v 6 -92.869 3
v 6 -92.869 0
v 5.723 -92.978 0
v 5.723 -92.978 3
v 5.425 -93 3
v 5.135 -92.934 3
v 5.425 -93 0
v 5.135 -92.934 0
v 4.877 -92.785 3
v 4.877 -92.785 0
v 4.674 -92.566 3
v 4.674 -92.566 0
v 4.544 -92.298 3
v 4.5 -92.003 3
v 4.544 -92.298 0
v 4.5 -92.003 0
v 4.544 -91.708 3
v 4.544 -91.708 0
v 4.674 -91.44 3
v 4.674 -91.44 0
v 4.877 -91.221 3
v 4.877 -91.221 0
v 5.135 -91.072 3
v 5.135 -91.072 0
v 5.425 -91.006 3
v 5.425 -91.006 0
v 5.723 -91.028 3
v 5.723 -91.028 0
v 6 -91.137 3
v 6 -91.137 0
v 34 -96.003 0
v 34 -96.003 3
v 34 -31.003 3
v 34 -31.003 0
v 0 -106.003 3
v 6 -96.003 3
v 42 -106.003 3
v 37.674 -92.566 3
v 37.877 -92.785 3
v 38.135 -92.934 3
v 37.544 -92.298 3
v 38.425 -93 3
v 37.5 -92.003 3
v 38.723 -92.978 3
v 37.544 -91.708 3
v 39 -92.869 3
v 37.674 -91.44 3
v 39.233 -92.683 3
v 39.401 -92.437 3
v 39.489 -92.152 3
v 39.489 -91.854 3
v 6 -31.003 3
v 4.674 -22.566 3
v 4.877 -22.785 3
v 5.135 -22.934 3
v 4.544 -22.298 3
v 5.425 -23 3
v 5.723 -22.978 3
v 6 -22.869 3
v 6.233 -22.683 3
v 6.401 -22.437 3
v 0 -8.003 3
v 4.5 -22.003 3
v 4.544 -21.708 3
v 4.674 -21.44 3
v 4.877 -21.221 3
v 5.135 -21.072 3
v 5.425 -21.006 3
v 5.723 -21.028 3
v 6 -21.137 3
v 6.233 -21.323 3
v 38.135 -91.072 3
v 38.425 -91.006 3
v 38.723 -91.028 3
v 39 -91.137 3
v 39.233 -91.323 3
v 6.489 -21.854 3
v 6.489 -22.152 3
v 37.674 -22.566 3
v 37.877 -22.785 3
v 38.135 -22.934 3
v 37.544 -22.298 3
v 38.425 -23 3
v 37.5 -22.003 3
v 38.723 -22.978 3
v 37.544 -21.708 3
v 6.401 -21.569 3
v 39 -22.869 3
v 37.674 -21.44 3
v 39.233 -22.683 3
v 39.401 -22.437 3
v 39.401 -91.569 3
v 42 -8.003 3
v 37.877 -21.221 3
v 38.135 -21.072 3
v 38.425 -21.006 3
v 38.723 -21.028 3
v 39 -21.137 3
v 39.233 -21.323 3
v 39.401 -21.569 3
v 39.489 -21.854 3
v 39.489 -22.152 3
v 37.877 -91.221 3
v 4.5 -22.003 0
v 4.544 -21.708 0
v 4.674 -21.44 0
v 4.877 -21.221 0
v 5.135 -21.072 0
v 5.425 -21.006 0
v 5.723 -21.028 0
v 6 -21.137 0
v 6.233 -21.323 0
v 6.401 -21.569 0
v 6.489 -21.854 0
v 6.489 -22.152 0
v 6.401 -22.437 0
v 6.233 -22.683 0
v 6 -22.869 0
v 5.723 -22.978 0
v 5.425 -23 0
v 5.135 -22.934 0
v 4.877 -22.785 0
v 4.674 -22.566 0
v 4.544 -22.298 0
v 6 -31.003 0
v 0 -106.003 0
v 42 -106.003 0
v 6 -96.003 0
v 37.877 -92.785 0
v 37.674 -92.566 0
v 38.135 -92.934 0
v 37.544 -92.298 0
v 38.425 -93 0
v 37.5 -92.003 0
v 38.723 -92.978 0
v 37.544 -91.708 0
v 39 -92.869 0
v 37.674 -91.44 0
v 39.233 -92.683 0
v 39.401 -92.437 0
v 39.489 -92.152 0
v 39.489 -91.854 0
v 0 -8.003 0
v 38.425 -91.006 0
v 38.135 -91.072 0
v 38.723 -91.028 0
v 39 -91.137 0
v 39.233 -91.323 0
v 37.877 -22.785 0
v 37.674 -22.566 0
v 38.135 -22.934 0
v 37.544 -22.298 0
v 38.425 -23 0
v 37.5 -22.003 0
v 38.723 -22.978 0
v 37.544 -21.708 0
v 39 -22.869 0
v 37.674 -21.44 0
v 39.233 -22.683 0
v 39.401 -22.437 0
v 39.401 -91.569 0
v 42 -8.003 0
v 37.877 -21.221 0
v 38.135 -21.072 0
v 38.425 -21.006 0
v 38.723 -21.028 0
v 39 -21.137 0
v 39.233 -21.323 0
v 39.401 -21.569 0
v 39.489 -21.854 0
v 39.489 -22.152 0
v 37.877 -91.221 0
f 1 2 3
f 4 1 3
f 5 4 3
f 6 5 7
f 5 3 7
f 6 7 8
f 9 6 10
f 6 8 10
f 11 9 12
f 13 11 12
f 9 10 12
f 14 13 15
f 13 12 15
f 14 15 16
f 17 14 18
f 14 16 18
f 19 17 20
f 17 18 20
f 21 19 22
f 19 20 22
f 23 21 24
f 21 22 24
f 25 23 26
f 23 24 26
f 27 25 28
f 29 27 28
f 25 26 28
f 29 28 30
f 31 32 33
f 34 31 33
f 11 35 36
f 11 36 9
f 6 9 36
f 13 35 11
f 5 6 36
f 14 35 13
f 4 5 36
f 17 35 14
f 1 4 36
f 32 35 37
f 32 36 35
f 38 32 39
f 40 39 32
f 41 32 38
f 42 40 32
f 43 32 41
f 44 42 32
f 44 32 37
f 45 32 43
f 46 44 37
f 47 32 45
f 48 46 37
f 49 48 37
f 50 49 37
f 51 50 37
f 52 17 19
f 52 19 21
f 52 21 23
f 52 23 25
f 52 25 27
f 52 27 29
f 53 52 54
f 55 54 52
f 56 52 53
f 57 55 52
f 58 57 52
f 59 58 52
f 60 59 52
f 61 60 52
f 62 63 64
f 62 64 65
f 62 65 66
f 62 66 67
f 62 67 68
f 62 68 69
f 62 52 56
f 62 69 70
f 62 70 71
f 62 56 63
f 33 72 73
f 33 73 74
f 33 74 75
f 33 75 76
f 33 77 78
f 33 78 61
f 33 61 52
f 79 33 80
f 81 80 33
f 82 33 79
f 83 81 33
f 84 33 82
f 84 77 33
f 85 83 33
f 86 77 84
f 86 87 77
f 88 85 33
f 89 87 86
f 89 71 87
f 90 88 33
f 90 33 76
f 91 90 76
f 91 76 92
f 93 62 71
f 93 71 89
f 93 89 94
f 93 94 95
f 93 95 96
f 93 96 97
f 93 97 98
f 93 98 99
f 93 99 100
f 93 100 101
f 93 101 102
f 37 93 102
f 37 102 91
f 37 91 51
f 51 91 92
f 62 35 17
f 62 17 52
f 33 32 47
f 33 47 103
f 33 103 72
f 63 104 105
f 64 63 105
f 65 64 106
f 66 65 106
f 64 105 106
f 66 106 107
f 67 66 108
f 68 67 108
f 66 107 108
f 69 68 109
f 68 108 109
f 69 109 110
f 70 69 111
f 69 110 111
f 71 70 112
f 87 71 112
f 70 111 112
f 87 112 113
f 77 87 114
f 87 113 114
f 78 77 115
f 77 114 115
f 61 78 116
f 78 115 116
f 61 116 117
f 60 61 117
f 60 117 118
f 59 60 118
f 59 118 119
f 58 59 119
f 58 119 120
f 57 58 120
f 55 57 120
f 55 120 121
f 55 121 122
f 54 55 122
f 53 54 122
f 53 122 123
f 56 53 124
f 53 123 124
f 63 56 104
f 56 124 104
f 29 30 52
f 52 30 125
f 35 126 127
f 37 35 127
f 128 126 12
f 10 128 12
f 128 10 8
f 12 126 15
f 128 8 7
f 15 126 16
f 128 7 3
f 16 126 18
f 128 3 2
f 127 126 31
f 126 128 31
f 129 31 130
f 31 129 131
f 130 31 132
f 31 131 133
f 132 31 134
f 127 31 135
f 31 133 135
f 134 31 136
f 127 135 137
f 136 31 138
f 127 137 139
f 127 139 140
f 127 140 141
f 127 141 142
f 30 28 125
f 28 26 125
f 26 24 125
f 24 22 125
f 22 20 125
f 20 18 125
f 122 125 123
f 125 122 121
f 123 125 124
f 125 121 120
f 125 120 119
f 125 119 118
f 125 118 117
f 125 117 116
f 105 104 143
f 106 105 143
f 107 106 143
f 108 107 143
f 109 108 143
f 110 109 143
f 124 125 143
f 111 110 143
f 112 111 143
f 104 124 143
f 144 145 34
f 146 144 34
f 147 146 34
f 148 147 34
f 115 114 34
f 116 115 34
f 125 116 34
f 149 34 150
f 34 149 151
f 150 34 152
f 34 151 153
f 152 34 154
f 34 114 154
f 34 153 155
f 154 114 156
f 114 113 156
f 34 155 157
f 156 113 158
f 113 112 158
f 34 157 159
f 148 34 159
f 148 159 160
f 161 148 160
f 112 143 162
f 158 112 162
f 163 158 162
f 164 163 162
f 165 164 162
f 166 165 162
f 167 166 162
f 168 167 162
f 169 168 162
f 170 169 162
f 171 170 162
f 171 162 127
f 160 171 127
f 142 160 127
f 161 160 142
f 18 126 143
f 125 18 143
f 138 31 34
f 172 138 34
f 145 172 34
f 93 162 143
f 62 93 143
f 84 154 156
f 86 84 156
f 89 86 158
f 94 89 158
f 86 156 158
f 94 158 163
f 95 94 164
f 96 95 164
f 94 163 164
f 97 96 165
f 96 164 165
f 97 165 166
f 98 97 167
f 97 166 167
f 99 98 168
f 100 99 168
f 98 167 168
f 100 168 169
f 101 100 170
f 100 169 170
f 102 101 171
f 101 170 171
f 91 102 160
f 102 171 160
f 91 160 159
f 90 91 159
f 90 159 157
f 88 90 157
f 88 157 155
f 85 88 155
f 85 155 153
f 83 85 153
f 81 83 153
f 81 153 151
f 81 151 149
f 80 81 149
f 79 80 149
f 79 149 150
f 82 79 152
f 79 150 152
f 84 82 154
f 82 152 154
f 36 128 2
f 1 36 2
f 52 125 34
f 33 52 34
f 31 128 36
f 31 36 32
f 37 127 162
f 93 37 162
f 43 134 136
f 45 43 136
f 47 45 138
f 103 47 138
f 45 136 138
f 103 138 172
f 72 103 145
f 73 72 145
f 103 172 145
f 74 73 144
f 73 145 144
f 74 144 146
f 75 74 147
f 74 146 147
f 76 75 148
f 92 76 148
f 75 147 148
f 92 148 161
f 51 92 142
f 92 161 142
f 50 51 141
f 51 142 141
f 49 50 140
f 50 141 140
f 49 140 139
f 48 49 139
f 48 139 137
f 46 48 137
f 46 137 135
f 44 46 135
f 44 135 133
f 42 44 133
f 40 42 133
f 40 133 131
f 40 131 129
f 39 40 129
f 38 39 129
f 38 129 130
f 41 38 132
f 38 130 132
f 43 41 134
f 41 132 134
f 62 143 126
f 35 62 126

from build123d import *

# Parameters (mm, degrees)
SKETCH1_W           = 30
SKETCH1_H           = 65
BOSS_EXTRUDE1_DEPTH = 3
SKETCH3_R           = 1
CUT_EXTRUDE1_DEPTH  = 3
SKETCH4_W           = 2
SKETCH4_H           = 65
BOSS_EXTRUDE2_DEPTH = 3


with BuildPart() as part:
    # Sketch1 → Boss-Extrude1 (new body)
    with BuildSketch(Plane.XY):
        Polygon((0, 0), (0, -114.006141835), (0, -92.003070917), (0, -106.003070917), (6, -106.003070917), (36, -106.003070917), (42, -106.003070917), (42, -92.003070917), (42, -114.006141835), (42, 0), (42, -22.003070917), (42, -8.003070917), (36, -8.003070917), (6, -8.003070917), (0, -8.003070917), (0, -22.003070917), align=None)
        with Locations((21, -63.503070917)):
            Rectangle(SKETCH1_W, SKETCH1_H, mode=Mode.SUBTRACT)
    extrude(amount=BOSS_EXTRUDE1_DEPTH)

    # Sketch3 → Cut-Extrude1 (cut)
    with BuildSketch(Plane(origin=(0, 0, 0), x_dir=(-1, 0, 0), z_dir=(0, 0, -1))):
        with Locations((-38.5, -22.003070917)):
            Circle(SKETCH3_R)
        with Locations((-5.5, -22.003070917)):
            Circle(SKETCH3_R)
        with Locations((-5.5, -92.003070917)):
            Circle(SKETCH3_R)
        with Locations((-38.5, -92.003070917)):
            Circle(SKETCH3_R)
    extrude(amount=-CUT_EXTRUDE1_DEPTH, mode=Mode.SUBTRACT)

    # Sketch4 → Boss-Extrude2 (add)
    with BuildSketch(Plane.XY.offset(3)):
        with Locations((35, -63.503070917)):
            Rectangle(SKETCH4_W, SKETCH4_H)
    extrude(amount=-BOSS_EXTRUDE2_DEPTH)


solid = part.part
